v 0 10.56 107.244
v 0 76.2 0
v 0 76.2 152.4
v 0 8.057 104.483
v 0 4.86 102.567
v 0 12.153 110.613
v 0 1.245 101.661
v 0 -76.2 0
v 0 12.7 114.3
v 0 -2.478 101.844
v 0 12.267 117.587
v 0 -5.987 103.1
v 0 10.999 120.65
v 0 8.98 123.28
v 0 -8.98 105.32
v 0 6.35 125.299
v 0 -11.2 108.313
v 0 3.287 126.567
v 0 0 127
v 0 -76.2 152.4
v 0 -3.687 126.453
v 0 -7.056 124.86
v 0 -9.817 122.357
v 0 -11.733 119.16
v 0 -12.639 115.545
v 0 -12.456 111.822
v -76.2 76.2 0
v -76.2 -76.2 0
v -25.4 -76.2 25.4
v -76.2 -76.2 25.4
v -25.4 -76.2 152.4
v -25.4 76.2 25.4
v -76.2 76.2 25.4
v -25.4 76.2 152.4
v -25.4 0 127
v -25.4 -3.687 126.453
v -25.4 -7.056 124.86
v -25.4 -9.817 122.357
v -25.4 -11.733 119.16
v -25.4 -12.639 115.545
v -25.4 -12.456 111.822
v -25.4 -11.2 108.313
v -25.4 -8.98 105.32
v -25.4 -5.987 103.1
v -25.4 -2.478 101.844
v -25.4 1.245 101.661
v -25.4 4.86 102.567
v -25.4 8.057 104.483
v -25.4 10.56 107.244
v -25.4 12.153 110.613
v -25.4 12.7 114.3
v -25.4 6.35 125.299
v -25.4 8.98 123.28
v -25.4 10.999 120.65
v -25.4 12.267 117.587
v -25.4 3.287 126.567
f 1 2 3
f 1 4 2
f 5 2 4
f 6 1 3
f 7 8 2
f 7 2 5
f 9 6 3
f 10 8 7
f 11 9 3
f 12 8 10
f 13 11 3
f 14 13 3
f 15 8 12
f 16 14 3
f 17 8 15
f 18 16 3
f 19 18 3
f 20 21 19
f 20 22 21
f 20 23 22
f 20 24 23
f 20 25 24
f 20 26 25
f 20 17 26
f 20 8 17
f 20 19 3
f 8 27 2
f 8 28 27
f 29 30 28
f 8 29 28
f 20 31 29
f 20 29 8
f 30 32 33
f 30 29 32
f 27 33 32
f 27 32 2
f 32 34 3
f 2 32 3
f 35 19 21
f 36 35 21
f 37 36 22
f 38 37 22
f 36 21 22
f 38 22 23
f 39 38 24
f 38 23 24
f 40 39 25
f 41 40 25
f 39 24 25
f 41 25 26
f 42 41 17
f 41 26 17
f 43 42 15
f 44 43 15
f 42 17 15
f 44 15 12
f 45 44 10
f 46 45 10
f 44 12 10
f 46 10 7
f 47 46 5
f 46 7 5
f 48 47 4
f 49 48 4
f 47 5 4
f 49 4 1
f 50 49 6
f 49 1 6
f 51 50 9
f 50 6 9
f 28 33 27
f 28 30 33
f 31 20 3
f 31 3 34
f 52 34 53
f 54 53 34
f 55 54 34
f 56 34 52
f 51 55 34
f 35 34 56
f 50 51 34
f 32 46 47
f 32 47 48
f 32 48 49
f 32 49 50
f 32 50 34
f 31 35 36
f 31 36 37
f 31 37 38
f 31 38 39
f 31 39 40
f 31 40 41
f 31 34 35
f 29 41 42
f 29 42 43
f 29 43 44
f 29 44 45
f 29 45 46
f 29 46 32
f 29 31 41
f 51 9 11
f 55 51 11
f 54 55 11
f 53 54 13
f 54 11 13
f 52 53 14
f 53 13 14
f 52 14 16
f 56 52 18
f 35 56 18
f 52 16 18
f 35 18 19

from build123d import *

# Parameters (mm, degrees)
F1_DEPTH = 76.2
F3_DEPTH = 50.8


with BuildPart() as f1:
    # F0 (on Front) → F1 (new body, symmetric)
    with BuildSketch(Plane.XZ):
        Polygon((-76.2, 0), (0, 0), (0, 152.4), (-25.4, 152.4), (-25.4, 25.4), (-76.2, 25.4), align=None)
    extrude(amount=F1_DEPTH, both=True)

    # F2 (on face) → F3 (cut)
    with BuildSketch(Plane.YZ):
        with BuildLine():
            Line((0, 114.3), (0, 127))
            ThreePointArc((0, 127), (-8.980256, 105.319744), (12.7, 114.3))
            Line((12.7, 114.3), (0, 114.3))
        make_face()
        with BuildLine():
            ThreePointArc((12.7, 114.3), (8.980256, 123.280256), (0, 127))
            Line((0, 127), (0, 114.3))
            Line((0, 114.3), (12.7, 114.3))
        make_face()
    extrude(amount=-F3_DEPTH, mode=Mode.SUBTRACT)


solid = f1.part
